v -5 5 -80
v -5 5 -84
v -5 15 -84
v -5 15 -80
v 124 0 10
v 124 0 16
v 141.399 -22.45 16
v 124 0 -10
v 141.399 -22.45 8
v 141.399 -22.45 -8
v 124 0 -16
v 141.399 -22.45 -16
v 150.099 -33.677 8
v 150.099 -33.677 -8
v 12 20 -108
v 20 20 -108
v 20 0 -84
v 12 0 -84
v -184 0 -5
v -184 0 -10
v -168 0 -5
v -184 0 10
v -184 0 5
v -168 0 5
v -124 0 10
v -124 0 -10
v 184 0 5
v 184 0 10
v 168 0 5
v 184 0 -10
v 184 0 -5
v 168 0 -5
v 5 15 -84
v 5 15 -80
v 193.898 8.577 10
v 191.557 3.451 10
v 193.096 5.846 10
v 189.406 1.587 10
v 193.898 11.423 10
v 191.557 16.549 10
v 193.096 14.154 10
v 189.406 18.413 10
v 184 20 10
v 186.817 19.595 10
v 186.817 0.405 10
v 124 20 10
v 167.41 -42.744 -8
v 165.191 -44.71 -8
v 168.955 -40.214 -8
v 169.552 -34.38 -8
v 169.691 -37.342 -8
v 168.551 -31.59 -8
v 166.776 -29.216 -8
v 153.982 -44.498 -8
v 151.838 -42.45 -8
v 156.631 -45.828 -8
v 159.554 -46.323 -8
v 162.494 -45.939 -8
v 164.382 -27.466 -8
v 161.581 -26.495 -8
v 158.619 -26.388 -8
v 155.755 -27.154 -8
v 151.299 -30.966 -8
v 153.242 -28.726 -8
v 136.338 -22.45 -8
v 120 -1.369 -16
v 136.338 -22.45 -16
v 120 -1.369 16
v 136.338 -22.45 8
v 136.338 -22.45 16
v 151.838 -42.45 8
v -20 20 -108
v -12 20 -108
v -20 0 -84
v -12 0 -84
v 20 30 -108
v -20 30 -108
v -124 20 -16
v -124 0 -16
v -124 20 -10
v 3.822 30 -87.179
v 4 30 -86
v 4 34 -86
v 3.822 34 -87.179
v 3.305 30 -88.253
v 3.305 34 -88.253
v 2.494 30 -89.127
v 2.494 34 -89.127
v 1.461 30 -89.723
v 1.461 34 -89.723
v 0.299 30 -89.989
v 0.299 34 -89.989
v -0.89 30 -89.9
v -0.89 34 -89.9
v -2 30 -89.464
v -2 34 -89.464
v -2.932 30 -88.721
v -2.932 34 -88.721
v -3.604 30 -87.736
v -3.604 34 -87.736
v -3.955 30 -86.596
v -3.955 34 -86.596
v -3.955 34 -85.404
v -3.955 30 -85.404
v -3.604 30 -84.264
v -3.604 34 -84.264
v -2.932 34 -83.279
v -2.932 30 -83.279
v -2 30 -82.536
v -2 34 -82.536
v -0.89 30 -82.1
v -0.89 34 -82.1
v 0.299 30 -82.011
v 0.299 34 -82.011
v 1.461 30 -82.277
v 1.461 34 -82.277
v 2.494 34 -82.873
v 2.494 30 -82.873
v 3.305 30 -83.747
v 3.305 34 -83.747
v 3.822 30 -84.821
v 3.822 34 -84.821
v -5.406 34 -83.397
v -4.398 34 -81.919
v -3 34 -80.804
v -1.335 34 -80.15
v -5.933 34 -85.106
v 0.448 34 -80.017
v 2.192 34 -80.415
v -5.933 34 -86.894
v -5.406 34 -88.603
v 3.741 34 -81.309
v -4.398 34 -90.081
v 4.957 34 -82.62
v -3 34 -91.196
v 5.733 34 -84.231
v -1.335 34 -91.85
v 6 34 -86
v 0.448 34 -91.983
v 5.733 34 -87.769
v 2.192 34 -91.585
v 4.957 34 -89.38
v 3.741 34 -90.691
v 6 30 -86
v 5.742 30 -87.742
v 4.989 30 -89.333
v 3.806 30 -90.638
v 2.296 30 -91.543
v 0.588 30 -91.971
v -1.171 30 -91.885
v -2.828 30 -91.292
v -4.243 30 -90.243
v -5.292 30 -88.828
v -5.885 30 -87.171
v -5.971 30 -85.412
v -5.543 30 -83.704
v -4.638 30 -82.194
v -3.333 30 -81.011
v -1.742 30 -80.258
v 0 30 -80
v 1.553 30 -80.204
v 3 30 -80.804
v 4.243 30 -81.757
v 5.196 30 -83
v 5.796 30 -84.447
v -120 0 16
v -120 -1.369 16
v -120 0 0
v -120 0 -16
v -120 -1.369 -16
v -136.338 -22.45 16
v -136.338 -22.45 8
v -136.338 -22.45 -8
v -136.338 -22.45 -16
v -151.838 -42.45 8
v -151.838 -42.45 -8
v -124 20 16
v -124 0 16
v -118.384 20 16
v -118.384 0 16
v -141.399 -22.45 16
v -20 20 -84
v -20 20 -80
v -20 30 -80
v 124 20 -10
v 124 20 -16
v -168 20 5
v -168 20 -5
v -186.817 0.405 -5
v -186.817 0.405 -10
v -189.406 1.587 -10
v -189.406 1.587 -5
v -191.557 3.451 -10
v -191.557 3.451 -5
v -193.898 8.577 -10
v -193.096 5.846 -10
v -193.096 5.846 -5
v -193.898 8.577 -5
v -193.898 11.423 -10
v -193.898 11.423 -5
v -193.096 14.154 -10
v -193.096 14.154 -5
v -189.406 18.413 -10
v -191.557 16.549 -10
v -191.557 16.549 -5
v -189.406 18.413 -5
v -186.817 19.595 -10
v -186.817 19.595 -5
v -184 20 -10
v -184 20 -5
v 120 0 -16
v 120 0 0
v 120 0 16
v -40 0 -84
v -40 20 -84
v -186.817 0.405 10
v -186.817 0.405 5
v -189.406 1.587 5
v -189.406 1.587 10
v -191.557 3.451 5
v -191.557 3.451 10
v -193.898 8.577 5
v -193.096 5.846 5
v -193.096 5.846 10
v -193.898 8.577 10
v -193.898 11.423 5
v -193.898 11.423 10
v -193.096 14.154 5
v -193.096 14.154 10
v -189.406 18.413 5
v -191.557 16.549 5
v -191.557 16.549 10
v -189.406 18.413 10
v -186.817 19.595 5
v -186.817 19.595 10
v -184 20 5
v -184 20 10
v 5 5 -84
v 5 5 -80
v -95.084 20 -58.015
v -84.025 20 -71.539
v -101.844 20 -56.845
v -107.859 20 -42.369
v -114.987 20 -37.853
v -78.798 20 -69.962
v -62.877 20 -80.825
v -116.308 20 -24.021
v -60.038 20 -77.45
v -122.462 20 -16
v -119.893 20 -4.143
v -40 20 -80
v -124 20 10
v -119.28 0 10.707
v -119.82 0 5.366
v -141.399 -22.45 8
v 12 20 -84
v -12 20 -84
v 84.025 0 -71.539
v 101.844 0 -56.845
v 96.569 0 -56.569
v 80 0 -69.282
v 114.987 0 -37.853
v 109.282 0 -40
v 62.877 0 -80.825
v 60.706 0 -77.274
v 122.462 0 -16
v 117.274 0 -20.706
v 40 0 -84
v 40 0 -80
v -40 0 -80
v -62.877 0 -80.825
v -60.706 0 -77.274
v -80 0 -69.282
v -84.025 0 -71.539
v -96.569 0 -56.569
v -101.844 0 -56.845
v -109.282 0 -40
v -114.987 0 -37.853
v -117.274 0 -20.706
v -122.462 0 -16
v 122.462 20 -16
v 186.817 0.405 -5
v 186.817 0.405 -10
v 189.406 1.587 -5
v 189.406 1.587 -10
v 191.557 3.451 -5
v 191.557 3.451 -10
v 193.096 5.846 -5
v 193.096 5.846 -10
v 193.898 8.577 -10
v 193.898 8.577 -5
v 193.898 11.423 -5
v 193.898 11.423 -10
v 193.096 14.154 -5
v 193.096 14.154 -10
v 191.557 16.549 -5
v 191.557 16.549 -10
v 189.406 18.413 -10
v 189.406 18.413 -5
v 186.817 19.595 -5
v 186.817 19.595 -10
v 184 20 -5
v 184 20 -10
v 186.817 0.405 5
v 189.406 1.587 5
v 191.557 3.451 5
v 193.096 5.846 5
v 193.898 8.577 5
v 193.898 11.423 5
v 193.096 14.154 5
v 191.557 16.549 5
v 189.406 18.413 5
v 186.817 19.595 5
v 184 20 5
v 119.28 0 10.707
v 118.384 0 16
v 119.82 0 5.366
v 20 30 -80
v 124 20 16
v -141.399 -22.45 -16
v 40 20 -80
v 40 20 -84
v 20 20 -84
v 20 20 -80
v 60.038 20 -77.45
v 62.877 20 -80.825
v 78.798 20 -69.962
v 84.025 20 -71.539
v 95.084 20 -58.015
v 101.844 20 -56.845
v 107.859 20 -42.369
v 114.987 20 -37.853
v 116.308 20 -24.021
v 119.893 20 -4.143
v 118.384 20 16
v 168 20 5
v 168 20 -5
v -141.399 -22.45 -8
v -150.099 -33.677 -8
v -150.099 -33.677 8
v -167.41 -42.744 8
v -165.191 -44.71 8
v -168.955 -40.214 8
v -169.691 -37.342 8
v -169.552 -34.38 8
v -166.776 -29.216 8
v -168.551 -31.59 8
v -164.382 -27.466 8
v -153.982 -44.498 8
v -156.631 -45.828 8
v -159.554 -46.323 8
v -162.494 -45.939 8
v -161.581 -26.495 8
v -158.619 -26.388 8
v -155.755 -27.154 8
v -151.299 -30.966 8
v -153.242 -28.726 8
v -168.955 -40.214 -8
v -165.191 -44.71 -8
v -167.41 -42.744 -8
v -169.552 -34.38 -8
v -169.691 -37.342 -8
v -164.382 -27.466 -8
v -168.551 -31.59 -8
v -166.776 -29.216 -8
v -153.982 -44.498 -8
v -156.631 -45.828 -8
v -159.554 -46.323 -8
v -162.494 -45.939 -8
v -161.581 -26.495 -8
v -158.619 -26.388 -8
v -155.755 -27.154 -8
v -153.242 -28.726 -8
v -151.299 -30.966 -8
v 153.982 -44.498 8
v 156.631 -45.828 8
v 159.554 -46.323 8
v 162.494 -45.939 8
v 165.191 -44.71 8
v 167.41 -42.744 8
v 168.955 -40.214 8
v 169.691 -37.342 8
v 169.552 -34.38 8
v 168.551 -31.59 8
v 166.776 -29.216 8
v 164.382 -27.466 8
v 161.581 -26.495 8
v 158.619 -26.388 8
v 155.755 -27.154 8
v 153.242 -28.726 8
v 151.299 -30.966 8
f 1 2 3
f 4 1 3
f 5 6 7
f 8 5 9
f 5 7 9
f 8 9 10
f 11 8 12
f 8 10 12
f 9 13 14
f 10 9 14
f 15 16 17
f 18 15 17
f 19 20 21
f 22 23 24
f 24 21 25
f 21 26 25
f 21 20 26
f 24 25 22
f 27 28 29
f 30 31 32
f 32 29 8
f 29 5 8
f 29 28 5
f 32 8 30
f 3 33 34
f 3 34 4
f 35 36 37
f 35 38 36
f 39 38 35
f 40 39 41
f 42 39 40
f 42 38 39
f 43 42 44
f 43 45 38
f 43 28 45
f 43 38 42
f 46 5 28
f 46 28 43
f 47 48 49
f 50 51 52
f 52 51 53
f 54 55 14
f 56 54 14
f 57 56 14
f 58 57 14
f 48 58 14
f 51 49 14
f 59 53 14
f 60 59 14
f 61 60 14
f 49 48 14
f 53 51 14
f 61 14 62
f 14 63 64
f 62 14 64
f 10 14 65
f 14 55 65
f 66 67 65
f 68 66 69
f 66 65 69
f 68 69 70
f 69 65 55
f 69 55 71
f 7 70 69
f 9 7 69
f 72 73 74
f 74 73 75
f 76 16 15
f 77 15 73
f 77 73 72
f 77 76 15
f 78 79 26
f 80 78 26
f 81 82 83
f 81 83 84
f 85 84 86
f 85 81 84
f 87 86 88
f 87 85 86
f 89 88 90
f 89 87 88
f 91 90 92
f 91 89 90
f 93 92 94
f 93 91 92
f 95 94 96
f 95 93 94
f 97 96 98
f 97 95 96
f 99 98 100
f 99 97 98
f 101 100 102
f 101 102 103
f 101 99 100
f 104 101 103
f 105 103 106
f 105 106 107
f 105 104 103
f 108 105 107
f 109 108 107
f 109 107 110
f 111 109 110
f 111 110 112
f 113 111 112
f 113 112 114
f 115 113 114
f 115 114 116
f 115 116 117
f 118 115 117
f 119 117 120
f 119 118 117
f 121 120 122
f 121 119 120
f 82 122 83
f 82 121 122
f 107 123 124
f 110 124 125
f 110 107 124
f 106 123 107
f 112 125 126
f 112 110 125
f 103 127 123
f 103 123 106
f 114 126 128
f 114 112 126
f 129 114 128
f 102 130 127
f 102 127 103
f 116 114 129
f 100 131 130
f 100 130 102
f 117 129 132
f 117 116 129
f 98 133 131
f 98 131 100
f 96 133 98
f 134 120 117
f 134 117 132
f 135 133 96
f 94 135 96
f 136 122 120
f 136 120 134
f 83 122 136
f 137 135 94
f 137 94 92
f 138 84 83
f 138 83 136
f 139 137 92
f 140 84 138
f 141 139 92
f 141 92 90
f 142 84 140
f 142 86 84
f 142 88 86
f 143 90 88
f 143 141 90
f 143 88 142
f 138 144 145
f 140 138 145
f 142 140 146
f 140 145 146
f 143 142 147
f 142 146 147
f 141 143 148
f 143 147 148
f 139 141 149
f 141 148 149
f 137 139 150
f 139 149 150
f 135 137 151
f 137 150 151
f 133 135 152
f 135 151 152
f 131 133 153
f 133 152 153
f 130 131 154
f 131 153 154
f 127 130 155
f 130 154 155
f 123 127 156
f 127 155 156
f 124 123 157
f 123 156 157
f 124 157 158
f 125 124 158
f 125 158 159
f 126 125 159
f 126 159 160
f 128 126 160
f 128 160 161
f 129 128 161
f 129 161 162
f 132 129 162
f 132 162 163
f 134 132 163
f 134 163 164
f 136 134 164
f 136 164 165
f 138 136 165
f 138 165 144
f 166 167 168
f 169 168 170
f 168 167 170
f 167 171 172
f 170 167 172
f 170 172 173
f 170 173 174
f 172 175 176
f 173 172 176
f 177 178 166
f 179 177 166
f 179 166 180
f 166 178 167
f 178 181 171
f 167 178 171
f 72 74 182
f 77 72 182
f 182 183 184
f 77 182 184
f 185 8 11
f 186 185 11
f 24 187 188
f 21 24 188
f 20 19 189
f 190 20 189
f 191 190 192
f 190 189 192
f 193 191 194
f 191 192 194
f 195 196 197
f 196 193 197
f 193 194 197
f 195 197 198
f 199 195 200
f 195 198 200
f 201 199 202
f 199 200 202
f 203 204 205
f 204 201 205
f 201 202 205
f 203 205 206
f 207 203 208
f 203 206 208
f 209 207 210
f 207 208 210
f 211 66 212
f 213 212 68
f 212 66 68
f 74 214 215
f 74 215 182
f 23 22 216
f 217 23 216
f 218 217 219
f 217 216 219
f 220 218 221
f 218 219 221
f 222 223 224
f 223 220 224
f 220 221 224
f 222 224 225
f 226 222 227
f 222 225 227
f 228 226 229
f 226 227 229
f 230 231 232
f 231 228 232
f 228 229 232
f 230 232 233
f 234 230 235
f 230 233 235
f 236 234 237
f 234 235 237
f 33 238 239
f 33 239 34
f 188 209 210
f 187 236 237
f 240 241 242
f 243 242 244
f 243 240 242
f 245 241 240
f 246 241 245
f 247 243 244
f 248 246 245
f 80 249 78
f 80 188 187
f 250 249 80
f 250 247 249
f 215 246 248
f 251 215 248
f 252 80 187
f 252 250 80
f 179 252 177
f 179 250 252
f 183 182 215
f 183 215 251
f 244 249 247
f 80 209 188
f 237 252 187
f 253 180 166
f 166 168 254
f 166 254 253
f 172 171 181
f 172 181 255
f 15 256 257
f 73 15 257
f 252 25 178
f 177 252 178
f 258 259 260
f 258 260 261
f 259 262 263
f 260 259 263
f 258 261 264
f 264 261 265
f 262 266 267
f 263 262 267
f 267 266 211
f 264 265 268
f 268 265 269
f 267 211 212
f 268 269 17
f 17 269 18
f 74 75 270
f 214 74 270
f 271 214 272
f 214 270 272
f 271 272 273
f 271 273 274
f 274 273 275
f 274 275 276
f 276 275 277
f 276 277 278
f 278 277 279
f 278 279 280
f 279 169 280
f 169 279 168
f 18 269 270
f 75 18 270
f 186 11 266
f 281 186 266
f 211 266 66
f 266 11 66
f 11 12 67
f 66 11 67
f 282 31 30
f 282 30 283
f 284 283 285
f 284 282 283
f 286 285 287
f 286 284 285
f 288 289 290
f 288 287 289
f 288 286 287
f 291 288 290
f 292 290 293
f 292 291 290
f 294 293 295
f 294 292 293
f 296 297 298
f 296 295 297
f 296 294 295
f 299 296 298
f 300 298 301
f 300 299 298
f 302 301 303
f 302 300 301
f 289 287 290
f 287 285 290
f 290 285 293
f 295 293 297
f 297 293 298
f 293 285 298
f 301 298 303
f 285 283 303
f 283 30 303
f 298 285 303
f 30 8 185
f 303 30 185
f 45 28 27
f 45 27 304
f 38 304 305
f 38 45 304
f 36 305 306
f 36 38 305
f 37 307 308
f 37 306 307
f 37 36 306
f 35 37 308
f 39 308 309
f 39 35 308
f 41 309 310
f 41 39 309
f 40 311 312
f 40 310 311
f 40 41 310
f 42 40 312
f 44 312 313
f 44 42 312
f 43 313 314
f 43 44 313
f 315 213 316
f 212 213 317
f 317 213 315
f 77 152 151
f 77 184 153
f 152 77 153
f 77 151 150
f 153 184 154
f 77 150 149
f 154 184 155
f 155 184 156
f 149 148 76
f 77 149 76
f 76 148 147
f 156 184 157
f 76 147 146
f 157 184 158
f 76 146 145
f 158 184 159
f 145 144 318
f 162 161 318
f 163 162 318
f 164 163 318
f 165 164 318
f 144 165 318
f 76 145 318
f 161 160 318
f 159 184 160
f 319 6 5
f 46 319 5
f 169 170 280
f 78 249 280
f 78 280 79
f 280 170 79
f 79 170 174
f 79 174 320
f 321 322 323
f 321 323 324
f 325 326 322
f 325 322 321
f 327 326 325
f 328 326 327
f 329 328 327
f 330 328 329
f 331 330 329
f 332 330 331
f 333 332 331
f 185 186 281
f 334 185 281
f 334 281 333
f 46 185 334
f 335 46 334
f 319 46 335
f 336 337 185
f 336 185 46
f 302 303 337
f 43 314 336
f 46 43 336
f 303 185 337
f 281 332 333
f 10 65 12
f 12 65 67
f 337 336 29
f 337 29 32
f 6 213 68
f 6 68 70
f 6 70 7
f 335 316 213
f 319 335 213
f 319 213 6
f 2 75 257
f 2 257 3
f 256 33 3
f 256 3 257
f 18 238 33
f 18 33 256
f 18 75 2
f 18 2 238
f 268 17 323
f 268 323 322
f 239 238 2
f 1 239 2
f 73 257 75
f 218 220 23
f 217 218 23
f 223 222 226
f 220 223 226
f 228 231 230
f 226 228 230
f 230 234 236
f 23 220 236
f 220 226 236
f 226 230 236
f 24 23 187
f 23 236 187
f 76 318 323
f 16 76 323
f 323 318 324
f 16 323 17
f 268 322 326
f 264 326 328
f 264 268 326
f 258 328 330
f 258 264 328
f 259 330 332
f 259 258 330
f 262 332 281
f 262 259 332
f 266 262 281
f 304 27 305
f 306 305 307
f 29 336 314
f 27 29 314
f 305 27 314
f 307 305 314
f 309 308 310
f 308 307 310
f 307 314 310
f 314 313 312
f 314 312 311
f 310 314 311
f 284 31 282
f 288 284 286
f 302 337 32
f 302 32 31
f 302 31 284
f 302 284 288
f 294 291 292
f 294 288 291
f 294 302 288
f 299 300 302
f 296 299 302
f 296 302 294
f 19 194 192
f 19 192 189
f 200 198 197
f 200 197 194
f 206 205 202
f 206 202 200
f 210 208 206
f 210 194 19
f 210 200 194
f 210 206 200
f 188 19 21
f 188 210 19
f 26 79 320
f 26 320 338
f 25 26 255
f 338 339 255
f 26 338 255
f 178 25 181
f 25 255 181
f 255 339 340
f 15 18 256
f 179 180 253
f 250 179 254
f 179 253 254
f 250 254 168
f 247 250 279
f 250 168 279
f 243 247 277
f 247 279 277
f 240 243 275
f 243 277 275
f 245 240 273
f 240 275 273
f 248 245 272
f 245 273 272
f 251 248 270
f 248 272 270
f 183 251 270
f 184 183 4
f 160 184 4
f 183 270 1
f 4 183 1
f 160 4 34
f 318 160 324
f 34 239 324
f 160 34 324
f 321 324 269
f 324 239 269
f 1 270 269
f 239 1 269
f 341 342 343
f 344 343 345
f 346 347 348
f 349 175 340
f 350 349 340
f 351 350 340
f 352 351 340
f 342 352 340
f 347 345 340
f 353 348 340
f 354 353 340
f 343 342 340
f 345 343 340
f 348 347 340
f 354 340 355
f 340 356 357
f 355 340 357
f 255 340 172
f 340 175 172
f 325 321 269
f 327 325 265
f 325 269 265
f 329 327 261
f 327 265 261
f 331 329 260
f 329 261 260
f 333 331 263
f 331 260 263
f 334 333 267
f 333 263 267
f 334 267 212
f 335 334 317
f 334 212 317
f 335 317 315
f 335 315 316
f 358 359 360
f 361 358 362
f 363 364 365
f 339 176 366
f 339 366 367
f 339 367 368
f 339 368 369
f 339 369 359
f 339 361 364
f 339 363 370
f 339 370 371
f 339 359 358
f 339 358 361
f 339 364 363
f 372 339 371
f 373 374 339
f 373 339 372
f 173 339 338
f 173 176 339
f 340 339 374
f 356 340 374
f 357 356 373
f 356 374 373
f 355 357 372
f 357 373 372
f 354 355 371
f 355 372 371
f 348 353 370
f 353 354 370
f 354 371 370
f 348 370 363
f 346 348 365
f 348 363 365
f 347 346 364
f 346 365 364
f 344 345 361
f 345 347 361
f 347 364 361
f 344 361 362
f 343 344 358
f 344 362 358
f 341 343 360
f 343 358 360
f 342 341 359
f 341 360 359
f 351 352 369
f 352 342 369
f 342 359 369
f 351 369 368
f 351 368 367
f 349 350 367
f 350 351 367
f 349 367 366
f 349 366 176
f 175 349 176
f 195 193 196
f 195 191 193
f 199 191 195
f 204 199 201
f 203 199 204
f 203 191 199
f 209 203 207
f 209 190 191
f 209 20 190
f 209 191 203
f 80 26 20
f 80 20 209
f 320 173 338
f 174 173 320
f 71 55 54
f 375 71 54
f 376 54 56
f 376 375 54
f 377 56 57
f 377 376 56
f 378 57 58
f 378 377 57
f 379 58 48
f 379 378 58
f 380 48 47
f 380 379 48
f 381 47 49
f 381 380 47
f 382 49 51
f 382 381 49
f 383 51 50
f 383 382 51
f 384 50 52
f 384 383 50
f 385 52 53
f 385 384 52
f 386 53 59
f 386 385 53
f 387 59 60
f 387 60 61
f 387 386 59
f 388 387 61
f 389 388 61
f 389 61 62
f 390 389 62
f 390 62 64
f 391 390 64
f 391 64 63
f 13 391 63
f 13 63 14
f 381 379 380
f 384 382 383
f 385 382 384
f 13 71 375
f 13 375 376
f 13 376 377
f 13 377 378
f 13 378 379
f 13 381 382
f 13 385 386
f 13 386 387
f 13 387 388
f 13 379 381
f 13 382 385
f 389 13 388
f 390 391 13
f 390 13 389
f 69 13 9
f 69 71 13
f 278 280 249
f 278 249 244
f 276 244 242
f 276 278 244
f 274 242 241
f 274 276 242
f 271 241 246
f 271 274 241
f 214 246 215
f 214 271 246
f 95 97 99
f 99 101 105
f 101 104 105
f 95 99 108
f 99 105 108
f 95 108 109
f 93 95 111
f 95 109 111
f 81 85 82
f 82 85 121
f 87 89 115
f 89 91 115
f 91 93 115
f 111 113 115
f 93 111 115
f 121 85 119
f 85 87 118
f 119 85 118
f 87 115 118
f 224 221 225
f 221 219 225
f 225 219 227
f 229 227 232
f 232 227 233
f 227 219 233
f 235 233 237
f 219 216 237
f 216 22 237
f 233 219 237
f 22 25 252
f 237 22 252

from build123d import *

# Parameters (mm, degrees)
EXTRUDE_1_DEPTH           = 20
SKETCH_18_W               = 10
SKETCH_18_H               = 10
CUT_EXTRUDE_6_DEPTH       = 10
SKETCH_20_W               = 40
SKETCH_20_H               = 4
EXTRUDE_5_DEPTH           = 10
SKETCH_8_W                = 4
SKETCH_8_H                = 32
SKETCH_25_W               = 246.903686524
SKETCH_25_H               = 75.06139437
CUT_EXTRUDE_7_DEPTH       = 30
SKETCH_11_W               = 4
SKETCH_11_H               = 32
SKETCH_26_W               = 20
SKETCH_26_H               = 20
EXTRUDE_6_DEPTH           = 70
SKETCH_28_W               = 20
SKETCH_28_H               = 20
EXTRUDE_7_DEPTH           = 70
SKETCH_29_W               = 26
SKETCH_29_H               = 10
CUT_EXTRUDE_8_DEPTH       = 20
SKETCH_31_R               = 10
CUT_EXTRUDE_10_DEPTH      = 101
SKETCH_32_R               = 10
EXTRUDE_8_DEPTH           = 8
CUT_EXTRUDE_11_DEPTH      = 95
EXTRUDE_9_DEPTH           = 24
CUT_EXTRUDE_12_DEPTH      = 215
SKETCH_36_R               = 6
SKETCH_36_R_2             = 4
EXTRUDE_10_DEPTH          = 4
SKETCH_38_W               = 10.504176023
SKETCH_38_H               = 23.874283345
SKETCH_38_W_2             = 11.702143621
CUT_EXTRUDE_13_DEPTH      = 195
CUT_EXTRUDE_13_DEPTH_BACK = 195


with BuildPart() as part:
    # 草图2 → 凸台-拉伸1 (new body)
    with BuildSketch(Plane(origin=(0, 0, 0), x_dir=(1, 0, 0), z_dir=(0, 1, 0))):
        with BuildLine():
            Line((-40, 84), (40, 84))
            ThreePointArc((40, 84), (124, 0), (40, -84))
            Line((40, -84), (-40, -84))
            ThreePointArc((-40, -84), (-124, 0), (-40, 84))
        make_face()
        with BuildLine():
            Line((-40, 80), (40, 80))
            ThreePointArc((40, 80), (120, 0), (40, -80))
            Line((40, -80), (-40, -80))
            ThreePointArc((-40, -80), (-120, 0), (-40, 80))
        make_face(mode=Mode.SUBTRACT)
    extrude(amount=EXTRUDE_1_DEPTH)

    # 草图18 → 切除-拉伸6 (cut)
    with BuildSketch(Plane(origin=(0, 0, -84), x_dir=(-1, 0, 0), z_dir=(0, 0, -1))):
        with Locations((0, 10)):
            Rectangle(SKETCH_18_W, SKETCH_18_H)
    extrude(amount=-CUT_EXTRUDE_6_DEPTH, mode=Mode.SUBTRACT)

    # 草图20 → 凸台-拉伸5 (add)
    with BuildSketch(Plane(origin=(0, 20, 0), x_dir=(1, 0, 0), z_dir=(0, 1, 0))):
        with Locations((0, 82)):
            Rectangle(SKETCH_20_W, SKETCH_20_H)
    extrude(amount=EXTRUDE_5_DEPTH)

    # 扫描1: sweep along a path in 草图9
    with BuildLine(Plane.XY) as sweep_1_path:
        Line((-124, 20), (-124, 0))
        Line((-124, 0), (-155, -40))
    # 草图8 → 扫描1 (sweep)
    with BuildSketch(Plane(origin=(0, 20, 0), x_dir=(1, 0, 0), z_dir=(0, 1, 0))):
        with Locations((-122, 0)):
            Rectangle(SKETCH_8_W, SKETCH_8_H)
    sweep(path=sweep_1_path.line, transition=Transition.RIGHT)

    # 草图25 → 切除-拉伸7 (cut)
    with BuildSketch(Plane(origin=(0, 20, 0), x_dir=(1, 0, 0), z_dir=(0, 1, 0))):
        with Locations((0.98973075, -53.530697185)):
            Rectangle(SKETCH_25_W, SKETCH_25_H)
    extrude(amount=-CUT_EXTRUDE_7_DEPTH, mode=Mode.SUBTRACT)

    # 扫描2: sweep along a path in 草图27
    with BuildLine(Plane.XY) as sweep_2_path:
        Line((124, 20), (124, 0))
        Line((124, 0), (155, -40))
    # 草图11 → 扫描2 (sweep)
    with BuildSketch(Plane(origin=(0, 20, 0), x_dir=(1, 0, 0), z_dir=(0, 1, 0))):
        with Locations((122, 0)):
            Rectangle(SKETCH_11_W, SKETCH_11_H)
    sweep(path=sweep_2_path.line, transition=Transition.RIGHT)

    # 草图26 → 凸台-拉伸6 (add)
    with BuildSketch(Plane.ZY.offset(124)):
        with Locations((0, 10)):
            Rectangle(SKETCH_26_W, SKETCH_26_H)
    extrude(amount=EXTRUDE_6_DEPTH)

    # 草图28 → 凸台-拉伸7 (add)
    with BuildSketch(Plane(origin=(124, 0, 0), x_dir=(0, 0, -1), z_dir=(1, 0, 0))):
        with Locations((0, 10)):
            Rectangle(SKETCH_28_W, SKETCH_28_H)
    extrude(amount=EXTRUDE_7_DEPTH)

    # 草图29 → 切除-拉伸8 (cut)
    with BuildSketch(Plane(origin=(0, 20, 0), x_dir=(1, 0, 0), z_dir=(0, 1, 0))):
        with Locations((-181, 0)):
            Rectangle(SKETCH_29_W, SKETCH_29_H)
        with Locations((181, 0)):
            Rectangle(SKETCH_29_W, SKETCH_29_H)
    extrude(amount=-CUT_EXTRUDE_8_DEPTH, mode=Mode.SUBTRACT)

    # 草图31 → 切除-拉伸10 (cut, through all)
    with BuildSketch(Plane.XY.offset(16)):
        with Locations((-159.742490313, -36.324570007)):
            Circle(SKETCH_31_R)
        with Locations((159.742490313, -36.324570007)):
            Circle(SKETCH_31_R)
    extrude(amount=-CUT_EXTRUDE_10_DEPTH, mode=Mode.SUBTRACT)

    # 草图32 → 凸台-拉伸8 (add, symmetric)
    with BuildSketch(Plane.XY):
        with Locations((-159.742490313, -36.324570007)):
            Circle(SKETCH_32_R)
        with Locations((159.742490313, -36.324570007)):
            Circle(SKETCH_32_R)
    extrude(amount=EXTRUDE_8_DEPTH, both=True)

    # 草图33 → 切除-拉伸11 (cut, through all)
    with BuildSketch(Plane.XY.offset(10)):
        with BuildLine():
            Line((-184, 20), (-199.388740024, 20))
            Line((-199.388740024, 20), (-199.388740024, 0))
            Line((-199.388740024, 0), (-184, 0))
            ThreePointArc((-184, 0), (-194, 10), (-184, 20))
        make_face()
        with BuildLine():
            Line((184, 20), (198.413524526, 20))
            Line((198.413524526, 20), (198.413524526, 0))
            Line((198.413524526, 0), (184, 0))
            ThreePointArc((184, 0), (194, 10), (184, 20))
        make_face()
    extrude(amount=-CUT_EXTRUDE_11_DEPTH, mode=Mode.SUBTRACT)

    # 草图34 → 凸台-拉伸9 (add)
    with BuildSketch(Plane(origin=(0, 0, -84), x_dir=(-1, 0, 0), z_dir=(0, 0, -1))):
        Polygon((20, 30), (-20, 30), (-20, 20), (-20, 0), (-12, 0), (-12, 20), (12, 20), (12, 0), (20, 0), (20, 20), align=None)
    extrude(amount=EXTRUDE_9_DEPTH)

    # 草图35 → 切除-拉伸12 (cut, through all)
    with BuildSketch(Plane(origin=(20, 0, 0), x_dir=(0, 0, -1), z_dir=(1, 0, 0))):
        Polygon((108, 20), (84, 0), (110.80524342, 0), align=None)
    extrude(amount=-CUT_EXTRUDE_12_DEPTH, mode=Mode.SUBTRACT)

    # 草图36 → 凸台-拉伸10 (add)
    with BuildSketch(Plane(origin=(0, 30, 0), x_dir=(1, 0, 0), z_dir=(0, 1, 0))):
        with Locations((0, 86)):
            Circle(SKETCH_36_R)
        with Locations((0, 86)):
            Circle(SKETCH_36_R_2, mode=Mode.SUBTRACT)
    extrude(amount=EXTRUDE_10_DEPTH)

    # 草图38 → 切除-拉伸13 (cut, two sides)
    with BuildSketch(Plane(origin=(0, 0, 0), x_dir=(0, 0, -1), z_dir=(1, 0, 0))) as cut_extrude_13_sk:
        with Locations((-13.252088011, -34.387428335)):
            Rectangle(SKETCH_38_W, SKETCH_38_H)
        with Locations((13.851071811, -34.387428335)):
            Rectangle(SKETCH_38_W_2, SKETCH_38_H)
    extrude(amount=CUT_EXTRUDE_13_DEPTH, mode=Mode.SUBTRACT)
    extrude(cut_extrude_13_sk.sketch, amount=-CUT_EXTRUDE_13_DEPTH_BACK, mode=Mode.SUBTRACT)


solid = part.part
